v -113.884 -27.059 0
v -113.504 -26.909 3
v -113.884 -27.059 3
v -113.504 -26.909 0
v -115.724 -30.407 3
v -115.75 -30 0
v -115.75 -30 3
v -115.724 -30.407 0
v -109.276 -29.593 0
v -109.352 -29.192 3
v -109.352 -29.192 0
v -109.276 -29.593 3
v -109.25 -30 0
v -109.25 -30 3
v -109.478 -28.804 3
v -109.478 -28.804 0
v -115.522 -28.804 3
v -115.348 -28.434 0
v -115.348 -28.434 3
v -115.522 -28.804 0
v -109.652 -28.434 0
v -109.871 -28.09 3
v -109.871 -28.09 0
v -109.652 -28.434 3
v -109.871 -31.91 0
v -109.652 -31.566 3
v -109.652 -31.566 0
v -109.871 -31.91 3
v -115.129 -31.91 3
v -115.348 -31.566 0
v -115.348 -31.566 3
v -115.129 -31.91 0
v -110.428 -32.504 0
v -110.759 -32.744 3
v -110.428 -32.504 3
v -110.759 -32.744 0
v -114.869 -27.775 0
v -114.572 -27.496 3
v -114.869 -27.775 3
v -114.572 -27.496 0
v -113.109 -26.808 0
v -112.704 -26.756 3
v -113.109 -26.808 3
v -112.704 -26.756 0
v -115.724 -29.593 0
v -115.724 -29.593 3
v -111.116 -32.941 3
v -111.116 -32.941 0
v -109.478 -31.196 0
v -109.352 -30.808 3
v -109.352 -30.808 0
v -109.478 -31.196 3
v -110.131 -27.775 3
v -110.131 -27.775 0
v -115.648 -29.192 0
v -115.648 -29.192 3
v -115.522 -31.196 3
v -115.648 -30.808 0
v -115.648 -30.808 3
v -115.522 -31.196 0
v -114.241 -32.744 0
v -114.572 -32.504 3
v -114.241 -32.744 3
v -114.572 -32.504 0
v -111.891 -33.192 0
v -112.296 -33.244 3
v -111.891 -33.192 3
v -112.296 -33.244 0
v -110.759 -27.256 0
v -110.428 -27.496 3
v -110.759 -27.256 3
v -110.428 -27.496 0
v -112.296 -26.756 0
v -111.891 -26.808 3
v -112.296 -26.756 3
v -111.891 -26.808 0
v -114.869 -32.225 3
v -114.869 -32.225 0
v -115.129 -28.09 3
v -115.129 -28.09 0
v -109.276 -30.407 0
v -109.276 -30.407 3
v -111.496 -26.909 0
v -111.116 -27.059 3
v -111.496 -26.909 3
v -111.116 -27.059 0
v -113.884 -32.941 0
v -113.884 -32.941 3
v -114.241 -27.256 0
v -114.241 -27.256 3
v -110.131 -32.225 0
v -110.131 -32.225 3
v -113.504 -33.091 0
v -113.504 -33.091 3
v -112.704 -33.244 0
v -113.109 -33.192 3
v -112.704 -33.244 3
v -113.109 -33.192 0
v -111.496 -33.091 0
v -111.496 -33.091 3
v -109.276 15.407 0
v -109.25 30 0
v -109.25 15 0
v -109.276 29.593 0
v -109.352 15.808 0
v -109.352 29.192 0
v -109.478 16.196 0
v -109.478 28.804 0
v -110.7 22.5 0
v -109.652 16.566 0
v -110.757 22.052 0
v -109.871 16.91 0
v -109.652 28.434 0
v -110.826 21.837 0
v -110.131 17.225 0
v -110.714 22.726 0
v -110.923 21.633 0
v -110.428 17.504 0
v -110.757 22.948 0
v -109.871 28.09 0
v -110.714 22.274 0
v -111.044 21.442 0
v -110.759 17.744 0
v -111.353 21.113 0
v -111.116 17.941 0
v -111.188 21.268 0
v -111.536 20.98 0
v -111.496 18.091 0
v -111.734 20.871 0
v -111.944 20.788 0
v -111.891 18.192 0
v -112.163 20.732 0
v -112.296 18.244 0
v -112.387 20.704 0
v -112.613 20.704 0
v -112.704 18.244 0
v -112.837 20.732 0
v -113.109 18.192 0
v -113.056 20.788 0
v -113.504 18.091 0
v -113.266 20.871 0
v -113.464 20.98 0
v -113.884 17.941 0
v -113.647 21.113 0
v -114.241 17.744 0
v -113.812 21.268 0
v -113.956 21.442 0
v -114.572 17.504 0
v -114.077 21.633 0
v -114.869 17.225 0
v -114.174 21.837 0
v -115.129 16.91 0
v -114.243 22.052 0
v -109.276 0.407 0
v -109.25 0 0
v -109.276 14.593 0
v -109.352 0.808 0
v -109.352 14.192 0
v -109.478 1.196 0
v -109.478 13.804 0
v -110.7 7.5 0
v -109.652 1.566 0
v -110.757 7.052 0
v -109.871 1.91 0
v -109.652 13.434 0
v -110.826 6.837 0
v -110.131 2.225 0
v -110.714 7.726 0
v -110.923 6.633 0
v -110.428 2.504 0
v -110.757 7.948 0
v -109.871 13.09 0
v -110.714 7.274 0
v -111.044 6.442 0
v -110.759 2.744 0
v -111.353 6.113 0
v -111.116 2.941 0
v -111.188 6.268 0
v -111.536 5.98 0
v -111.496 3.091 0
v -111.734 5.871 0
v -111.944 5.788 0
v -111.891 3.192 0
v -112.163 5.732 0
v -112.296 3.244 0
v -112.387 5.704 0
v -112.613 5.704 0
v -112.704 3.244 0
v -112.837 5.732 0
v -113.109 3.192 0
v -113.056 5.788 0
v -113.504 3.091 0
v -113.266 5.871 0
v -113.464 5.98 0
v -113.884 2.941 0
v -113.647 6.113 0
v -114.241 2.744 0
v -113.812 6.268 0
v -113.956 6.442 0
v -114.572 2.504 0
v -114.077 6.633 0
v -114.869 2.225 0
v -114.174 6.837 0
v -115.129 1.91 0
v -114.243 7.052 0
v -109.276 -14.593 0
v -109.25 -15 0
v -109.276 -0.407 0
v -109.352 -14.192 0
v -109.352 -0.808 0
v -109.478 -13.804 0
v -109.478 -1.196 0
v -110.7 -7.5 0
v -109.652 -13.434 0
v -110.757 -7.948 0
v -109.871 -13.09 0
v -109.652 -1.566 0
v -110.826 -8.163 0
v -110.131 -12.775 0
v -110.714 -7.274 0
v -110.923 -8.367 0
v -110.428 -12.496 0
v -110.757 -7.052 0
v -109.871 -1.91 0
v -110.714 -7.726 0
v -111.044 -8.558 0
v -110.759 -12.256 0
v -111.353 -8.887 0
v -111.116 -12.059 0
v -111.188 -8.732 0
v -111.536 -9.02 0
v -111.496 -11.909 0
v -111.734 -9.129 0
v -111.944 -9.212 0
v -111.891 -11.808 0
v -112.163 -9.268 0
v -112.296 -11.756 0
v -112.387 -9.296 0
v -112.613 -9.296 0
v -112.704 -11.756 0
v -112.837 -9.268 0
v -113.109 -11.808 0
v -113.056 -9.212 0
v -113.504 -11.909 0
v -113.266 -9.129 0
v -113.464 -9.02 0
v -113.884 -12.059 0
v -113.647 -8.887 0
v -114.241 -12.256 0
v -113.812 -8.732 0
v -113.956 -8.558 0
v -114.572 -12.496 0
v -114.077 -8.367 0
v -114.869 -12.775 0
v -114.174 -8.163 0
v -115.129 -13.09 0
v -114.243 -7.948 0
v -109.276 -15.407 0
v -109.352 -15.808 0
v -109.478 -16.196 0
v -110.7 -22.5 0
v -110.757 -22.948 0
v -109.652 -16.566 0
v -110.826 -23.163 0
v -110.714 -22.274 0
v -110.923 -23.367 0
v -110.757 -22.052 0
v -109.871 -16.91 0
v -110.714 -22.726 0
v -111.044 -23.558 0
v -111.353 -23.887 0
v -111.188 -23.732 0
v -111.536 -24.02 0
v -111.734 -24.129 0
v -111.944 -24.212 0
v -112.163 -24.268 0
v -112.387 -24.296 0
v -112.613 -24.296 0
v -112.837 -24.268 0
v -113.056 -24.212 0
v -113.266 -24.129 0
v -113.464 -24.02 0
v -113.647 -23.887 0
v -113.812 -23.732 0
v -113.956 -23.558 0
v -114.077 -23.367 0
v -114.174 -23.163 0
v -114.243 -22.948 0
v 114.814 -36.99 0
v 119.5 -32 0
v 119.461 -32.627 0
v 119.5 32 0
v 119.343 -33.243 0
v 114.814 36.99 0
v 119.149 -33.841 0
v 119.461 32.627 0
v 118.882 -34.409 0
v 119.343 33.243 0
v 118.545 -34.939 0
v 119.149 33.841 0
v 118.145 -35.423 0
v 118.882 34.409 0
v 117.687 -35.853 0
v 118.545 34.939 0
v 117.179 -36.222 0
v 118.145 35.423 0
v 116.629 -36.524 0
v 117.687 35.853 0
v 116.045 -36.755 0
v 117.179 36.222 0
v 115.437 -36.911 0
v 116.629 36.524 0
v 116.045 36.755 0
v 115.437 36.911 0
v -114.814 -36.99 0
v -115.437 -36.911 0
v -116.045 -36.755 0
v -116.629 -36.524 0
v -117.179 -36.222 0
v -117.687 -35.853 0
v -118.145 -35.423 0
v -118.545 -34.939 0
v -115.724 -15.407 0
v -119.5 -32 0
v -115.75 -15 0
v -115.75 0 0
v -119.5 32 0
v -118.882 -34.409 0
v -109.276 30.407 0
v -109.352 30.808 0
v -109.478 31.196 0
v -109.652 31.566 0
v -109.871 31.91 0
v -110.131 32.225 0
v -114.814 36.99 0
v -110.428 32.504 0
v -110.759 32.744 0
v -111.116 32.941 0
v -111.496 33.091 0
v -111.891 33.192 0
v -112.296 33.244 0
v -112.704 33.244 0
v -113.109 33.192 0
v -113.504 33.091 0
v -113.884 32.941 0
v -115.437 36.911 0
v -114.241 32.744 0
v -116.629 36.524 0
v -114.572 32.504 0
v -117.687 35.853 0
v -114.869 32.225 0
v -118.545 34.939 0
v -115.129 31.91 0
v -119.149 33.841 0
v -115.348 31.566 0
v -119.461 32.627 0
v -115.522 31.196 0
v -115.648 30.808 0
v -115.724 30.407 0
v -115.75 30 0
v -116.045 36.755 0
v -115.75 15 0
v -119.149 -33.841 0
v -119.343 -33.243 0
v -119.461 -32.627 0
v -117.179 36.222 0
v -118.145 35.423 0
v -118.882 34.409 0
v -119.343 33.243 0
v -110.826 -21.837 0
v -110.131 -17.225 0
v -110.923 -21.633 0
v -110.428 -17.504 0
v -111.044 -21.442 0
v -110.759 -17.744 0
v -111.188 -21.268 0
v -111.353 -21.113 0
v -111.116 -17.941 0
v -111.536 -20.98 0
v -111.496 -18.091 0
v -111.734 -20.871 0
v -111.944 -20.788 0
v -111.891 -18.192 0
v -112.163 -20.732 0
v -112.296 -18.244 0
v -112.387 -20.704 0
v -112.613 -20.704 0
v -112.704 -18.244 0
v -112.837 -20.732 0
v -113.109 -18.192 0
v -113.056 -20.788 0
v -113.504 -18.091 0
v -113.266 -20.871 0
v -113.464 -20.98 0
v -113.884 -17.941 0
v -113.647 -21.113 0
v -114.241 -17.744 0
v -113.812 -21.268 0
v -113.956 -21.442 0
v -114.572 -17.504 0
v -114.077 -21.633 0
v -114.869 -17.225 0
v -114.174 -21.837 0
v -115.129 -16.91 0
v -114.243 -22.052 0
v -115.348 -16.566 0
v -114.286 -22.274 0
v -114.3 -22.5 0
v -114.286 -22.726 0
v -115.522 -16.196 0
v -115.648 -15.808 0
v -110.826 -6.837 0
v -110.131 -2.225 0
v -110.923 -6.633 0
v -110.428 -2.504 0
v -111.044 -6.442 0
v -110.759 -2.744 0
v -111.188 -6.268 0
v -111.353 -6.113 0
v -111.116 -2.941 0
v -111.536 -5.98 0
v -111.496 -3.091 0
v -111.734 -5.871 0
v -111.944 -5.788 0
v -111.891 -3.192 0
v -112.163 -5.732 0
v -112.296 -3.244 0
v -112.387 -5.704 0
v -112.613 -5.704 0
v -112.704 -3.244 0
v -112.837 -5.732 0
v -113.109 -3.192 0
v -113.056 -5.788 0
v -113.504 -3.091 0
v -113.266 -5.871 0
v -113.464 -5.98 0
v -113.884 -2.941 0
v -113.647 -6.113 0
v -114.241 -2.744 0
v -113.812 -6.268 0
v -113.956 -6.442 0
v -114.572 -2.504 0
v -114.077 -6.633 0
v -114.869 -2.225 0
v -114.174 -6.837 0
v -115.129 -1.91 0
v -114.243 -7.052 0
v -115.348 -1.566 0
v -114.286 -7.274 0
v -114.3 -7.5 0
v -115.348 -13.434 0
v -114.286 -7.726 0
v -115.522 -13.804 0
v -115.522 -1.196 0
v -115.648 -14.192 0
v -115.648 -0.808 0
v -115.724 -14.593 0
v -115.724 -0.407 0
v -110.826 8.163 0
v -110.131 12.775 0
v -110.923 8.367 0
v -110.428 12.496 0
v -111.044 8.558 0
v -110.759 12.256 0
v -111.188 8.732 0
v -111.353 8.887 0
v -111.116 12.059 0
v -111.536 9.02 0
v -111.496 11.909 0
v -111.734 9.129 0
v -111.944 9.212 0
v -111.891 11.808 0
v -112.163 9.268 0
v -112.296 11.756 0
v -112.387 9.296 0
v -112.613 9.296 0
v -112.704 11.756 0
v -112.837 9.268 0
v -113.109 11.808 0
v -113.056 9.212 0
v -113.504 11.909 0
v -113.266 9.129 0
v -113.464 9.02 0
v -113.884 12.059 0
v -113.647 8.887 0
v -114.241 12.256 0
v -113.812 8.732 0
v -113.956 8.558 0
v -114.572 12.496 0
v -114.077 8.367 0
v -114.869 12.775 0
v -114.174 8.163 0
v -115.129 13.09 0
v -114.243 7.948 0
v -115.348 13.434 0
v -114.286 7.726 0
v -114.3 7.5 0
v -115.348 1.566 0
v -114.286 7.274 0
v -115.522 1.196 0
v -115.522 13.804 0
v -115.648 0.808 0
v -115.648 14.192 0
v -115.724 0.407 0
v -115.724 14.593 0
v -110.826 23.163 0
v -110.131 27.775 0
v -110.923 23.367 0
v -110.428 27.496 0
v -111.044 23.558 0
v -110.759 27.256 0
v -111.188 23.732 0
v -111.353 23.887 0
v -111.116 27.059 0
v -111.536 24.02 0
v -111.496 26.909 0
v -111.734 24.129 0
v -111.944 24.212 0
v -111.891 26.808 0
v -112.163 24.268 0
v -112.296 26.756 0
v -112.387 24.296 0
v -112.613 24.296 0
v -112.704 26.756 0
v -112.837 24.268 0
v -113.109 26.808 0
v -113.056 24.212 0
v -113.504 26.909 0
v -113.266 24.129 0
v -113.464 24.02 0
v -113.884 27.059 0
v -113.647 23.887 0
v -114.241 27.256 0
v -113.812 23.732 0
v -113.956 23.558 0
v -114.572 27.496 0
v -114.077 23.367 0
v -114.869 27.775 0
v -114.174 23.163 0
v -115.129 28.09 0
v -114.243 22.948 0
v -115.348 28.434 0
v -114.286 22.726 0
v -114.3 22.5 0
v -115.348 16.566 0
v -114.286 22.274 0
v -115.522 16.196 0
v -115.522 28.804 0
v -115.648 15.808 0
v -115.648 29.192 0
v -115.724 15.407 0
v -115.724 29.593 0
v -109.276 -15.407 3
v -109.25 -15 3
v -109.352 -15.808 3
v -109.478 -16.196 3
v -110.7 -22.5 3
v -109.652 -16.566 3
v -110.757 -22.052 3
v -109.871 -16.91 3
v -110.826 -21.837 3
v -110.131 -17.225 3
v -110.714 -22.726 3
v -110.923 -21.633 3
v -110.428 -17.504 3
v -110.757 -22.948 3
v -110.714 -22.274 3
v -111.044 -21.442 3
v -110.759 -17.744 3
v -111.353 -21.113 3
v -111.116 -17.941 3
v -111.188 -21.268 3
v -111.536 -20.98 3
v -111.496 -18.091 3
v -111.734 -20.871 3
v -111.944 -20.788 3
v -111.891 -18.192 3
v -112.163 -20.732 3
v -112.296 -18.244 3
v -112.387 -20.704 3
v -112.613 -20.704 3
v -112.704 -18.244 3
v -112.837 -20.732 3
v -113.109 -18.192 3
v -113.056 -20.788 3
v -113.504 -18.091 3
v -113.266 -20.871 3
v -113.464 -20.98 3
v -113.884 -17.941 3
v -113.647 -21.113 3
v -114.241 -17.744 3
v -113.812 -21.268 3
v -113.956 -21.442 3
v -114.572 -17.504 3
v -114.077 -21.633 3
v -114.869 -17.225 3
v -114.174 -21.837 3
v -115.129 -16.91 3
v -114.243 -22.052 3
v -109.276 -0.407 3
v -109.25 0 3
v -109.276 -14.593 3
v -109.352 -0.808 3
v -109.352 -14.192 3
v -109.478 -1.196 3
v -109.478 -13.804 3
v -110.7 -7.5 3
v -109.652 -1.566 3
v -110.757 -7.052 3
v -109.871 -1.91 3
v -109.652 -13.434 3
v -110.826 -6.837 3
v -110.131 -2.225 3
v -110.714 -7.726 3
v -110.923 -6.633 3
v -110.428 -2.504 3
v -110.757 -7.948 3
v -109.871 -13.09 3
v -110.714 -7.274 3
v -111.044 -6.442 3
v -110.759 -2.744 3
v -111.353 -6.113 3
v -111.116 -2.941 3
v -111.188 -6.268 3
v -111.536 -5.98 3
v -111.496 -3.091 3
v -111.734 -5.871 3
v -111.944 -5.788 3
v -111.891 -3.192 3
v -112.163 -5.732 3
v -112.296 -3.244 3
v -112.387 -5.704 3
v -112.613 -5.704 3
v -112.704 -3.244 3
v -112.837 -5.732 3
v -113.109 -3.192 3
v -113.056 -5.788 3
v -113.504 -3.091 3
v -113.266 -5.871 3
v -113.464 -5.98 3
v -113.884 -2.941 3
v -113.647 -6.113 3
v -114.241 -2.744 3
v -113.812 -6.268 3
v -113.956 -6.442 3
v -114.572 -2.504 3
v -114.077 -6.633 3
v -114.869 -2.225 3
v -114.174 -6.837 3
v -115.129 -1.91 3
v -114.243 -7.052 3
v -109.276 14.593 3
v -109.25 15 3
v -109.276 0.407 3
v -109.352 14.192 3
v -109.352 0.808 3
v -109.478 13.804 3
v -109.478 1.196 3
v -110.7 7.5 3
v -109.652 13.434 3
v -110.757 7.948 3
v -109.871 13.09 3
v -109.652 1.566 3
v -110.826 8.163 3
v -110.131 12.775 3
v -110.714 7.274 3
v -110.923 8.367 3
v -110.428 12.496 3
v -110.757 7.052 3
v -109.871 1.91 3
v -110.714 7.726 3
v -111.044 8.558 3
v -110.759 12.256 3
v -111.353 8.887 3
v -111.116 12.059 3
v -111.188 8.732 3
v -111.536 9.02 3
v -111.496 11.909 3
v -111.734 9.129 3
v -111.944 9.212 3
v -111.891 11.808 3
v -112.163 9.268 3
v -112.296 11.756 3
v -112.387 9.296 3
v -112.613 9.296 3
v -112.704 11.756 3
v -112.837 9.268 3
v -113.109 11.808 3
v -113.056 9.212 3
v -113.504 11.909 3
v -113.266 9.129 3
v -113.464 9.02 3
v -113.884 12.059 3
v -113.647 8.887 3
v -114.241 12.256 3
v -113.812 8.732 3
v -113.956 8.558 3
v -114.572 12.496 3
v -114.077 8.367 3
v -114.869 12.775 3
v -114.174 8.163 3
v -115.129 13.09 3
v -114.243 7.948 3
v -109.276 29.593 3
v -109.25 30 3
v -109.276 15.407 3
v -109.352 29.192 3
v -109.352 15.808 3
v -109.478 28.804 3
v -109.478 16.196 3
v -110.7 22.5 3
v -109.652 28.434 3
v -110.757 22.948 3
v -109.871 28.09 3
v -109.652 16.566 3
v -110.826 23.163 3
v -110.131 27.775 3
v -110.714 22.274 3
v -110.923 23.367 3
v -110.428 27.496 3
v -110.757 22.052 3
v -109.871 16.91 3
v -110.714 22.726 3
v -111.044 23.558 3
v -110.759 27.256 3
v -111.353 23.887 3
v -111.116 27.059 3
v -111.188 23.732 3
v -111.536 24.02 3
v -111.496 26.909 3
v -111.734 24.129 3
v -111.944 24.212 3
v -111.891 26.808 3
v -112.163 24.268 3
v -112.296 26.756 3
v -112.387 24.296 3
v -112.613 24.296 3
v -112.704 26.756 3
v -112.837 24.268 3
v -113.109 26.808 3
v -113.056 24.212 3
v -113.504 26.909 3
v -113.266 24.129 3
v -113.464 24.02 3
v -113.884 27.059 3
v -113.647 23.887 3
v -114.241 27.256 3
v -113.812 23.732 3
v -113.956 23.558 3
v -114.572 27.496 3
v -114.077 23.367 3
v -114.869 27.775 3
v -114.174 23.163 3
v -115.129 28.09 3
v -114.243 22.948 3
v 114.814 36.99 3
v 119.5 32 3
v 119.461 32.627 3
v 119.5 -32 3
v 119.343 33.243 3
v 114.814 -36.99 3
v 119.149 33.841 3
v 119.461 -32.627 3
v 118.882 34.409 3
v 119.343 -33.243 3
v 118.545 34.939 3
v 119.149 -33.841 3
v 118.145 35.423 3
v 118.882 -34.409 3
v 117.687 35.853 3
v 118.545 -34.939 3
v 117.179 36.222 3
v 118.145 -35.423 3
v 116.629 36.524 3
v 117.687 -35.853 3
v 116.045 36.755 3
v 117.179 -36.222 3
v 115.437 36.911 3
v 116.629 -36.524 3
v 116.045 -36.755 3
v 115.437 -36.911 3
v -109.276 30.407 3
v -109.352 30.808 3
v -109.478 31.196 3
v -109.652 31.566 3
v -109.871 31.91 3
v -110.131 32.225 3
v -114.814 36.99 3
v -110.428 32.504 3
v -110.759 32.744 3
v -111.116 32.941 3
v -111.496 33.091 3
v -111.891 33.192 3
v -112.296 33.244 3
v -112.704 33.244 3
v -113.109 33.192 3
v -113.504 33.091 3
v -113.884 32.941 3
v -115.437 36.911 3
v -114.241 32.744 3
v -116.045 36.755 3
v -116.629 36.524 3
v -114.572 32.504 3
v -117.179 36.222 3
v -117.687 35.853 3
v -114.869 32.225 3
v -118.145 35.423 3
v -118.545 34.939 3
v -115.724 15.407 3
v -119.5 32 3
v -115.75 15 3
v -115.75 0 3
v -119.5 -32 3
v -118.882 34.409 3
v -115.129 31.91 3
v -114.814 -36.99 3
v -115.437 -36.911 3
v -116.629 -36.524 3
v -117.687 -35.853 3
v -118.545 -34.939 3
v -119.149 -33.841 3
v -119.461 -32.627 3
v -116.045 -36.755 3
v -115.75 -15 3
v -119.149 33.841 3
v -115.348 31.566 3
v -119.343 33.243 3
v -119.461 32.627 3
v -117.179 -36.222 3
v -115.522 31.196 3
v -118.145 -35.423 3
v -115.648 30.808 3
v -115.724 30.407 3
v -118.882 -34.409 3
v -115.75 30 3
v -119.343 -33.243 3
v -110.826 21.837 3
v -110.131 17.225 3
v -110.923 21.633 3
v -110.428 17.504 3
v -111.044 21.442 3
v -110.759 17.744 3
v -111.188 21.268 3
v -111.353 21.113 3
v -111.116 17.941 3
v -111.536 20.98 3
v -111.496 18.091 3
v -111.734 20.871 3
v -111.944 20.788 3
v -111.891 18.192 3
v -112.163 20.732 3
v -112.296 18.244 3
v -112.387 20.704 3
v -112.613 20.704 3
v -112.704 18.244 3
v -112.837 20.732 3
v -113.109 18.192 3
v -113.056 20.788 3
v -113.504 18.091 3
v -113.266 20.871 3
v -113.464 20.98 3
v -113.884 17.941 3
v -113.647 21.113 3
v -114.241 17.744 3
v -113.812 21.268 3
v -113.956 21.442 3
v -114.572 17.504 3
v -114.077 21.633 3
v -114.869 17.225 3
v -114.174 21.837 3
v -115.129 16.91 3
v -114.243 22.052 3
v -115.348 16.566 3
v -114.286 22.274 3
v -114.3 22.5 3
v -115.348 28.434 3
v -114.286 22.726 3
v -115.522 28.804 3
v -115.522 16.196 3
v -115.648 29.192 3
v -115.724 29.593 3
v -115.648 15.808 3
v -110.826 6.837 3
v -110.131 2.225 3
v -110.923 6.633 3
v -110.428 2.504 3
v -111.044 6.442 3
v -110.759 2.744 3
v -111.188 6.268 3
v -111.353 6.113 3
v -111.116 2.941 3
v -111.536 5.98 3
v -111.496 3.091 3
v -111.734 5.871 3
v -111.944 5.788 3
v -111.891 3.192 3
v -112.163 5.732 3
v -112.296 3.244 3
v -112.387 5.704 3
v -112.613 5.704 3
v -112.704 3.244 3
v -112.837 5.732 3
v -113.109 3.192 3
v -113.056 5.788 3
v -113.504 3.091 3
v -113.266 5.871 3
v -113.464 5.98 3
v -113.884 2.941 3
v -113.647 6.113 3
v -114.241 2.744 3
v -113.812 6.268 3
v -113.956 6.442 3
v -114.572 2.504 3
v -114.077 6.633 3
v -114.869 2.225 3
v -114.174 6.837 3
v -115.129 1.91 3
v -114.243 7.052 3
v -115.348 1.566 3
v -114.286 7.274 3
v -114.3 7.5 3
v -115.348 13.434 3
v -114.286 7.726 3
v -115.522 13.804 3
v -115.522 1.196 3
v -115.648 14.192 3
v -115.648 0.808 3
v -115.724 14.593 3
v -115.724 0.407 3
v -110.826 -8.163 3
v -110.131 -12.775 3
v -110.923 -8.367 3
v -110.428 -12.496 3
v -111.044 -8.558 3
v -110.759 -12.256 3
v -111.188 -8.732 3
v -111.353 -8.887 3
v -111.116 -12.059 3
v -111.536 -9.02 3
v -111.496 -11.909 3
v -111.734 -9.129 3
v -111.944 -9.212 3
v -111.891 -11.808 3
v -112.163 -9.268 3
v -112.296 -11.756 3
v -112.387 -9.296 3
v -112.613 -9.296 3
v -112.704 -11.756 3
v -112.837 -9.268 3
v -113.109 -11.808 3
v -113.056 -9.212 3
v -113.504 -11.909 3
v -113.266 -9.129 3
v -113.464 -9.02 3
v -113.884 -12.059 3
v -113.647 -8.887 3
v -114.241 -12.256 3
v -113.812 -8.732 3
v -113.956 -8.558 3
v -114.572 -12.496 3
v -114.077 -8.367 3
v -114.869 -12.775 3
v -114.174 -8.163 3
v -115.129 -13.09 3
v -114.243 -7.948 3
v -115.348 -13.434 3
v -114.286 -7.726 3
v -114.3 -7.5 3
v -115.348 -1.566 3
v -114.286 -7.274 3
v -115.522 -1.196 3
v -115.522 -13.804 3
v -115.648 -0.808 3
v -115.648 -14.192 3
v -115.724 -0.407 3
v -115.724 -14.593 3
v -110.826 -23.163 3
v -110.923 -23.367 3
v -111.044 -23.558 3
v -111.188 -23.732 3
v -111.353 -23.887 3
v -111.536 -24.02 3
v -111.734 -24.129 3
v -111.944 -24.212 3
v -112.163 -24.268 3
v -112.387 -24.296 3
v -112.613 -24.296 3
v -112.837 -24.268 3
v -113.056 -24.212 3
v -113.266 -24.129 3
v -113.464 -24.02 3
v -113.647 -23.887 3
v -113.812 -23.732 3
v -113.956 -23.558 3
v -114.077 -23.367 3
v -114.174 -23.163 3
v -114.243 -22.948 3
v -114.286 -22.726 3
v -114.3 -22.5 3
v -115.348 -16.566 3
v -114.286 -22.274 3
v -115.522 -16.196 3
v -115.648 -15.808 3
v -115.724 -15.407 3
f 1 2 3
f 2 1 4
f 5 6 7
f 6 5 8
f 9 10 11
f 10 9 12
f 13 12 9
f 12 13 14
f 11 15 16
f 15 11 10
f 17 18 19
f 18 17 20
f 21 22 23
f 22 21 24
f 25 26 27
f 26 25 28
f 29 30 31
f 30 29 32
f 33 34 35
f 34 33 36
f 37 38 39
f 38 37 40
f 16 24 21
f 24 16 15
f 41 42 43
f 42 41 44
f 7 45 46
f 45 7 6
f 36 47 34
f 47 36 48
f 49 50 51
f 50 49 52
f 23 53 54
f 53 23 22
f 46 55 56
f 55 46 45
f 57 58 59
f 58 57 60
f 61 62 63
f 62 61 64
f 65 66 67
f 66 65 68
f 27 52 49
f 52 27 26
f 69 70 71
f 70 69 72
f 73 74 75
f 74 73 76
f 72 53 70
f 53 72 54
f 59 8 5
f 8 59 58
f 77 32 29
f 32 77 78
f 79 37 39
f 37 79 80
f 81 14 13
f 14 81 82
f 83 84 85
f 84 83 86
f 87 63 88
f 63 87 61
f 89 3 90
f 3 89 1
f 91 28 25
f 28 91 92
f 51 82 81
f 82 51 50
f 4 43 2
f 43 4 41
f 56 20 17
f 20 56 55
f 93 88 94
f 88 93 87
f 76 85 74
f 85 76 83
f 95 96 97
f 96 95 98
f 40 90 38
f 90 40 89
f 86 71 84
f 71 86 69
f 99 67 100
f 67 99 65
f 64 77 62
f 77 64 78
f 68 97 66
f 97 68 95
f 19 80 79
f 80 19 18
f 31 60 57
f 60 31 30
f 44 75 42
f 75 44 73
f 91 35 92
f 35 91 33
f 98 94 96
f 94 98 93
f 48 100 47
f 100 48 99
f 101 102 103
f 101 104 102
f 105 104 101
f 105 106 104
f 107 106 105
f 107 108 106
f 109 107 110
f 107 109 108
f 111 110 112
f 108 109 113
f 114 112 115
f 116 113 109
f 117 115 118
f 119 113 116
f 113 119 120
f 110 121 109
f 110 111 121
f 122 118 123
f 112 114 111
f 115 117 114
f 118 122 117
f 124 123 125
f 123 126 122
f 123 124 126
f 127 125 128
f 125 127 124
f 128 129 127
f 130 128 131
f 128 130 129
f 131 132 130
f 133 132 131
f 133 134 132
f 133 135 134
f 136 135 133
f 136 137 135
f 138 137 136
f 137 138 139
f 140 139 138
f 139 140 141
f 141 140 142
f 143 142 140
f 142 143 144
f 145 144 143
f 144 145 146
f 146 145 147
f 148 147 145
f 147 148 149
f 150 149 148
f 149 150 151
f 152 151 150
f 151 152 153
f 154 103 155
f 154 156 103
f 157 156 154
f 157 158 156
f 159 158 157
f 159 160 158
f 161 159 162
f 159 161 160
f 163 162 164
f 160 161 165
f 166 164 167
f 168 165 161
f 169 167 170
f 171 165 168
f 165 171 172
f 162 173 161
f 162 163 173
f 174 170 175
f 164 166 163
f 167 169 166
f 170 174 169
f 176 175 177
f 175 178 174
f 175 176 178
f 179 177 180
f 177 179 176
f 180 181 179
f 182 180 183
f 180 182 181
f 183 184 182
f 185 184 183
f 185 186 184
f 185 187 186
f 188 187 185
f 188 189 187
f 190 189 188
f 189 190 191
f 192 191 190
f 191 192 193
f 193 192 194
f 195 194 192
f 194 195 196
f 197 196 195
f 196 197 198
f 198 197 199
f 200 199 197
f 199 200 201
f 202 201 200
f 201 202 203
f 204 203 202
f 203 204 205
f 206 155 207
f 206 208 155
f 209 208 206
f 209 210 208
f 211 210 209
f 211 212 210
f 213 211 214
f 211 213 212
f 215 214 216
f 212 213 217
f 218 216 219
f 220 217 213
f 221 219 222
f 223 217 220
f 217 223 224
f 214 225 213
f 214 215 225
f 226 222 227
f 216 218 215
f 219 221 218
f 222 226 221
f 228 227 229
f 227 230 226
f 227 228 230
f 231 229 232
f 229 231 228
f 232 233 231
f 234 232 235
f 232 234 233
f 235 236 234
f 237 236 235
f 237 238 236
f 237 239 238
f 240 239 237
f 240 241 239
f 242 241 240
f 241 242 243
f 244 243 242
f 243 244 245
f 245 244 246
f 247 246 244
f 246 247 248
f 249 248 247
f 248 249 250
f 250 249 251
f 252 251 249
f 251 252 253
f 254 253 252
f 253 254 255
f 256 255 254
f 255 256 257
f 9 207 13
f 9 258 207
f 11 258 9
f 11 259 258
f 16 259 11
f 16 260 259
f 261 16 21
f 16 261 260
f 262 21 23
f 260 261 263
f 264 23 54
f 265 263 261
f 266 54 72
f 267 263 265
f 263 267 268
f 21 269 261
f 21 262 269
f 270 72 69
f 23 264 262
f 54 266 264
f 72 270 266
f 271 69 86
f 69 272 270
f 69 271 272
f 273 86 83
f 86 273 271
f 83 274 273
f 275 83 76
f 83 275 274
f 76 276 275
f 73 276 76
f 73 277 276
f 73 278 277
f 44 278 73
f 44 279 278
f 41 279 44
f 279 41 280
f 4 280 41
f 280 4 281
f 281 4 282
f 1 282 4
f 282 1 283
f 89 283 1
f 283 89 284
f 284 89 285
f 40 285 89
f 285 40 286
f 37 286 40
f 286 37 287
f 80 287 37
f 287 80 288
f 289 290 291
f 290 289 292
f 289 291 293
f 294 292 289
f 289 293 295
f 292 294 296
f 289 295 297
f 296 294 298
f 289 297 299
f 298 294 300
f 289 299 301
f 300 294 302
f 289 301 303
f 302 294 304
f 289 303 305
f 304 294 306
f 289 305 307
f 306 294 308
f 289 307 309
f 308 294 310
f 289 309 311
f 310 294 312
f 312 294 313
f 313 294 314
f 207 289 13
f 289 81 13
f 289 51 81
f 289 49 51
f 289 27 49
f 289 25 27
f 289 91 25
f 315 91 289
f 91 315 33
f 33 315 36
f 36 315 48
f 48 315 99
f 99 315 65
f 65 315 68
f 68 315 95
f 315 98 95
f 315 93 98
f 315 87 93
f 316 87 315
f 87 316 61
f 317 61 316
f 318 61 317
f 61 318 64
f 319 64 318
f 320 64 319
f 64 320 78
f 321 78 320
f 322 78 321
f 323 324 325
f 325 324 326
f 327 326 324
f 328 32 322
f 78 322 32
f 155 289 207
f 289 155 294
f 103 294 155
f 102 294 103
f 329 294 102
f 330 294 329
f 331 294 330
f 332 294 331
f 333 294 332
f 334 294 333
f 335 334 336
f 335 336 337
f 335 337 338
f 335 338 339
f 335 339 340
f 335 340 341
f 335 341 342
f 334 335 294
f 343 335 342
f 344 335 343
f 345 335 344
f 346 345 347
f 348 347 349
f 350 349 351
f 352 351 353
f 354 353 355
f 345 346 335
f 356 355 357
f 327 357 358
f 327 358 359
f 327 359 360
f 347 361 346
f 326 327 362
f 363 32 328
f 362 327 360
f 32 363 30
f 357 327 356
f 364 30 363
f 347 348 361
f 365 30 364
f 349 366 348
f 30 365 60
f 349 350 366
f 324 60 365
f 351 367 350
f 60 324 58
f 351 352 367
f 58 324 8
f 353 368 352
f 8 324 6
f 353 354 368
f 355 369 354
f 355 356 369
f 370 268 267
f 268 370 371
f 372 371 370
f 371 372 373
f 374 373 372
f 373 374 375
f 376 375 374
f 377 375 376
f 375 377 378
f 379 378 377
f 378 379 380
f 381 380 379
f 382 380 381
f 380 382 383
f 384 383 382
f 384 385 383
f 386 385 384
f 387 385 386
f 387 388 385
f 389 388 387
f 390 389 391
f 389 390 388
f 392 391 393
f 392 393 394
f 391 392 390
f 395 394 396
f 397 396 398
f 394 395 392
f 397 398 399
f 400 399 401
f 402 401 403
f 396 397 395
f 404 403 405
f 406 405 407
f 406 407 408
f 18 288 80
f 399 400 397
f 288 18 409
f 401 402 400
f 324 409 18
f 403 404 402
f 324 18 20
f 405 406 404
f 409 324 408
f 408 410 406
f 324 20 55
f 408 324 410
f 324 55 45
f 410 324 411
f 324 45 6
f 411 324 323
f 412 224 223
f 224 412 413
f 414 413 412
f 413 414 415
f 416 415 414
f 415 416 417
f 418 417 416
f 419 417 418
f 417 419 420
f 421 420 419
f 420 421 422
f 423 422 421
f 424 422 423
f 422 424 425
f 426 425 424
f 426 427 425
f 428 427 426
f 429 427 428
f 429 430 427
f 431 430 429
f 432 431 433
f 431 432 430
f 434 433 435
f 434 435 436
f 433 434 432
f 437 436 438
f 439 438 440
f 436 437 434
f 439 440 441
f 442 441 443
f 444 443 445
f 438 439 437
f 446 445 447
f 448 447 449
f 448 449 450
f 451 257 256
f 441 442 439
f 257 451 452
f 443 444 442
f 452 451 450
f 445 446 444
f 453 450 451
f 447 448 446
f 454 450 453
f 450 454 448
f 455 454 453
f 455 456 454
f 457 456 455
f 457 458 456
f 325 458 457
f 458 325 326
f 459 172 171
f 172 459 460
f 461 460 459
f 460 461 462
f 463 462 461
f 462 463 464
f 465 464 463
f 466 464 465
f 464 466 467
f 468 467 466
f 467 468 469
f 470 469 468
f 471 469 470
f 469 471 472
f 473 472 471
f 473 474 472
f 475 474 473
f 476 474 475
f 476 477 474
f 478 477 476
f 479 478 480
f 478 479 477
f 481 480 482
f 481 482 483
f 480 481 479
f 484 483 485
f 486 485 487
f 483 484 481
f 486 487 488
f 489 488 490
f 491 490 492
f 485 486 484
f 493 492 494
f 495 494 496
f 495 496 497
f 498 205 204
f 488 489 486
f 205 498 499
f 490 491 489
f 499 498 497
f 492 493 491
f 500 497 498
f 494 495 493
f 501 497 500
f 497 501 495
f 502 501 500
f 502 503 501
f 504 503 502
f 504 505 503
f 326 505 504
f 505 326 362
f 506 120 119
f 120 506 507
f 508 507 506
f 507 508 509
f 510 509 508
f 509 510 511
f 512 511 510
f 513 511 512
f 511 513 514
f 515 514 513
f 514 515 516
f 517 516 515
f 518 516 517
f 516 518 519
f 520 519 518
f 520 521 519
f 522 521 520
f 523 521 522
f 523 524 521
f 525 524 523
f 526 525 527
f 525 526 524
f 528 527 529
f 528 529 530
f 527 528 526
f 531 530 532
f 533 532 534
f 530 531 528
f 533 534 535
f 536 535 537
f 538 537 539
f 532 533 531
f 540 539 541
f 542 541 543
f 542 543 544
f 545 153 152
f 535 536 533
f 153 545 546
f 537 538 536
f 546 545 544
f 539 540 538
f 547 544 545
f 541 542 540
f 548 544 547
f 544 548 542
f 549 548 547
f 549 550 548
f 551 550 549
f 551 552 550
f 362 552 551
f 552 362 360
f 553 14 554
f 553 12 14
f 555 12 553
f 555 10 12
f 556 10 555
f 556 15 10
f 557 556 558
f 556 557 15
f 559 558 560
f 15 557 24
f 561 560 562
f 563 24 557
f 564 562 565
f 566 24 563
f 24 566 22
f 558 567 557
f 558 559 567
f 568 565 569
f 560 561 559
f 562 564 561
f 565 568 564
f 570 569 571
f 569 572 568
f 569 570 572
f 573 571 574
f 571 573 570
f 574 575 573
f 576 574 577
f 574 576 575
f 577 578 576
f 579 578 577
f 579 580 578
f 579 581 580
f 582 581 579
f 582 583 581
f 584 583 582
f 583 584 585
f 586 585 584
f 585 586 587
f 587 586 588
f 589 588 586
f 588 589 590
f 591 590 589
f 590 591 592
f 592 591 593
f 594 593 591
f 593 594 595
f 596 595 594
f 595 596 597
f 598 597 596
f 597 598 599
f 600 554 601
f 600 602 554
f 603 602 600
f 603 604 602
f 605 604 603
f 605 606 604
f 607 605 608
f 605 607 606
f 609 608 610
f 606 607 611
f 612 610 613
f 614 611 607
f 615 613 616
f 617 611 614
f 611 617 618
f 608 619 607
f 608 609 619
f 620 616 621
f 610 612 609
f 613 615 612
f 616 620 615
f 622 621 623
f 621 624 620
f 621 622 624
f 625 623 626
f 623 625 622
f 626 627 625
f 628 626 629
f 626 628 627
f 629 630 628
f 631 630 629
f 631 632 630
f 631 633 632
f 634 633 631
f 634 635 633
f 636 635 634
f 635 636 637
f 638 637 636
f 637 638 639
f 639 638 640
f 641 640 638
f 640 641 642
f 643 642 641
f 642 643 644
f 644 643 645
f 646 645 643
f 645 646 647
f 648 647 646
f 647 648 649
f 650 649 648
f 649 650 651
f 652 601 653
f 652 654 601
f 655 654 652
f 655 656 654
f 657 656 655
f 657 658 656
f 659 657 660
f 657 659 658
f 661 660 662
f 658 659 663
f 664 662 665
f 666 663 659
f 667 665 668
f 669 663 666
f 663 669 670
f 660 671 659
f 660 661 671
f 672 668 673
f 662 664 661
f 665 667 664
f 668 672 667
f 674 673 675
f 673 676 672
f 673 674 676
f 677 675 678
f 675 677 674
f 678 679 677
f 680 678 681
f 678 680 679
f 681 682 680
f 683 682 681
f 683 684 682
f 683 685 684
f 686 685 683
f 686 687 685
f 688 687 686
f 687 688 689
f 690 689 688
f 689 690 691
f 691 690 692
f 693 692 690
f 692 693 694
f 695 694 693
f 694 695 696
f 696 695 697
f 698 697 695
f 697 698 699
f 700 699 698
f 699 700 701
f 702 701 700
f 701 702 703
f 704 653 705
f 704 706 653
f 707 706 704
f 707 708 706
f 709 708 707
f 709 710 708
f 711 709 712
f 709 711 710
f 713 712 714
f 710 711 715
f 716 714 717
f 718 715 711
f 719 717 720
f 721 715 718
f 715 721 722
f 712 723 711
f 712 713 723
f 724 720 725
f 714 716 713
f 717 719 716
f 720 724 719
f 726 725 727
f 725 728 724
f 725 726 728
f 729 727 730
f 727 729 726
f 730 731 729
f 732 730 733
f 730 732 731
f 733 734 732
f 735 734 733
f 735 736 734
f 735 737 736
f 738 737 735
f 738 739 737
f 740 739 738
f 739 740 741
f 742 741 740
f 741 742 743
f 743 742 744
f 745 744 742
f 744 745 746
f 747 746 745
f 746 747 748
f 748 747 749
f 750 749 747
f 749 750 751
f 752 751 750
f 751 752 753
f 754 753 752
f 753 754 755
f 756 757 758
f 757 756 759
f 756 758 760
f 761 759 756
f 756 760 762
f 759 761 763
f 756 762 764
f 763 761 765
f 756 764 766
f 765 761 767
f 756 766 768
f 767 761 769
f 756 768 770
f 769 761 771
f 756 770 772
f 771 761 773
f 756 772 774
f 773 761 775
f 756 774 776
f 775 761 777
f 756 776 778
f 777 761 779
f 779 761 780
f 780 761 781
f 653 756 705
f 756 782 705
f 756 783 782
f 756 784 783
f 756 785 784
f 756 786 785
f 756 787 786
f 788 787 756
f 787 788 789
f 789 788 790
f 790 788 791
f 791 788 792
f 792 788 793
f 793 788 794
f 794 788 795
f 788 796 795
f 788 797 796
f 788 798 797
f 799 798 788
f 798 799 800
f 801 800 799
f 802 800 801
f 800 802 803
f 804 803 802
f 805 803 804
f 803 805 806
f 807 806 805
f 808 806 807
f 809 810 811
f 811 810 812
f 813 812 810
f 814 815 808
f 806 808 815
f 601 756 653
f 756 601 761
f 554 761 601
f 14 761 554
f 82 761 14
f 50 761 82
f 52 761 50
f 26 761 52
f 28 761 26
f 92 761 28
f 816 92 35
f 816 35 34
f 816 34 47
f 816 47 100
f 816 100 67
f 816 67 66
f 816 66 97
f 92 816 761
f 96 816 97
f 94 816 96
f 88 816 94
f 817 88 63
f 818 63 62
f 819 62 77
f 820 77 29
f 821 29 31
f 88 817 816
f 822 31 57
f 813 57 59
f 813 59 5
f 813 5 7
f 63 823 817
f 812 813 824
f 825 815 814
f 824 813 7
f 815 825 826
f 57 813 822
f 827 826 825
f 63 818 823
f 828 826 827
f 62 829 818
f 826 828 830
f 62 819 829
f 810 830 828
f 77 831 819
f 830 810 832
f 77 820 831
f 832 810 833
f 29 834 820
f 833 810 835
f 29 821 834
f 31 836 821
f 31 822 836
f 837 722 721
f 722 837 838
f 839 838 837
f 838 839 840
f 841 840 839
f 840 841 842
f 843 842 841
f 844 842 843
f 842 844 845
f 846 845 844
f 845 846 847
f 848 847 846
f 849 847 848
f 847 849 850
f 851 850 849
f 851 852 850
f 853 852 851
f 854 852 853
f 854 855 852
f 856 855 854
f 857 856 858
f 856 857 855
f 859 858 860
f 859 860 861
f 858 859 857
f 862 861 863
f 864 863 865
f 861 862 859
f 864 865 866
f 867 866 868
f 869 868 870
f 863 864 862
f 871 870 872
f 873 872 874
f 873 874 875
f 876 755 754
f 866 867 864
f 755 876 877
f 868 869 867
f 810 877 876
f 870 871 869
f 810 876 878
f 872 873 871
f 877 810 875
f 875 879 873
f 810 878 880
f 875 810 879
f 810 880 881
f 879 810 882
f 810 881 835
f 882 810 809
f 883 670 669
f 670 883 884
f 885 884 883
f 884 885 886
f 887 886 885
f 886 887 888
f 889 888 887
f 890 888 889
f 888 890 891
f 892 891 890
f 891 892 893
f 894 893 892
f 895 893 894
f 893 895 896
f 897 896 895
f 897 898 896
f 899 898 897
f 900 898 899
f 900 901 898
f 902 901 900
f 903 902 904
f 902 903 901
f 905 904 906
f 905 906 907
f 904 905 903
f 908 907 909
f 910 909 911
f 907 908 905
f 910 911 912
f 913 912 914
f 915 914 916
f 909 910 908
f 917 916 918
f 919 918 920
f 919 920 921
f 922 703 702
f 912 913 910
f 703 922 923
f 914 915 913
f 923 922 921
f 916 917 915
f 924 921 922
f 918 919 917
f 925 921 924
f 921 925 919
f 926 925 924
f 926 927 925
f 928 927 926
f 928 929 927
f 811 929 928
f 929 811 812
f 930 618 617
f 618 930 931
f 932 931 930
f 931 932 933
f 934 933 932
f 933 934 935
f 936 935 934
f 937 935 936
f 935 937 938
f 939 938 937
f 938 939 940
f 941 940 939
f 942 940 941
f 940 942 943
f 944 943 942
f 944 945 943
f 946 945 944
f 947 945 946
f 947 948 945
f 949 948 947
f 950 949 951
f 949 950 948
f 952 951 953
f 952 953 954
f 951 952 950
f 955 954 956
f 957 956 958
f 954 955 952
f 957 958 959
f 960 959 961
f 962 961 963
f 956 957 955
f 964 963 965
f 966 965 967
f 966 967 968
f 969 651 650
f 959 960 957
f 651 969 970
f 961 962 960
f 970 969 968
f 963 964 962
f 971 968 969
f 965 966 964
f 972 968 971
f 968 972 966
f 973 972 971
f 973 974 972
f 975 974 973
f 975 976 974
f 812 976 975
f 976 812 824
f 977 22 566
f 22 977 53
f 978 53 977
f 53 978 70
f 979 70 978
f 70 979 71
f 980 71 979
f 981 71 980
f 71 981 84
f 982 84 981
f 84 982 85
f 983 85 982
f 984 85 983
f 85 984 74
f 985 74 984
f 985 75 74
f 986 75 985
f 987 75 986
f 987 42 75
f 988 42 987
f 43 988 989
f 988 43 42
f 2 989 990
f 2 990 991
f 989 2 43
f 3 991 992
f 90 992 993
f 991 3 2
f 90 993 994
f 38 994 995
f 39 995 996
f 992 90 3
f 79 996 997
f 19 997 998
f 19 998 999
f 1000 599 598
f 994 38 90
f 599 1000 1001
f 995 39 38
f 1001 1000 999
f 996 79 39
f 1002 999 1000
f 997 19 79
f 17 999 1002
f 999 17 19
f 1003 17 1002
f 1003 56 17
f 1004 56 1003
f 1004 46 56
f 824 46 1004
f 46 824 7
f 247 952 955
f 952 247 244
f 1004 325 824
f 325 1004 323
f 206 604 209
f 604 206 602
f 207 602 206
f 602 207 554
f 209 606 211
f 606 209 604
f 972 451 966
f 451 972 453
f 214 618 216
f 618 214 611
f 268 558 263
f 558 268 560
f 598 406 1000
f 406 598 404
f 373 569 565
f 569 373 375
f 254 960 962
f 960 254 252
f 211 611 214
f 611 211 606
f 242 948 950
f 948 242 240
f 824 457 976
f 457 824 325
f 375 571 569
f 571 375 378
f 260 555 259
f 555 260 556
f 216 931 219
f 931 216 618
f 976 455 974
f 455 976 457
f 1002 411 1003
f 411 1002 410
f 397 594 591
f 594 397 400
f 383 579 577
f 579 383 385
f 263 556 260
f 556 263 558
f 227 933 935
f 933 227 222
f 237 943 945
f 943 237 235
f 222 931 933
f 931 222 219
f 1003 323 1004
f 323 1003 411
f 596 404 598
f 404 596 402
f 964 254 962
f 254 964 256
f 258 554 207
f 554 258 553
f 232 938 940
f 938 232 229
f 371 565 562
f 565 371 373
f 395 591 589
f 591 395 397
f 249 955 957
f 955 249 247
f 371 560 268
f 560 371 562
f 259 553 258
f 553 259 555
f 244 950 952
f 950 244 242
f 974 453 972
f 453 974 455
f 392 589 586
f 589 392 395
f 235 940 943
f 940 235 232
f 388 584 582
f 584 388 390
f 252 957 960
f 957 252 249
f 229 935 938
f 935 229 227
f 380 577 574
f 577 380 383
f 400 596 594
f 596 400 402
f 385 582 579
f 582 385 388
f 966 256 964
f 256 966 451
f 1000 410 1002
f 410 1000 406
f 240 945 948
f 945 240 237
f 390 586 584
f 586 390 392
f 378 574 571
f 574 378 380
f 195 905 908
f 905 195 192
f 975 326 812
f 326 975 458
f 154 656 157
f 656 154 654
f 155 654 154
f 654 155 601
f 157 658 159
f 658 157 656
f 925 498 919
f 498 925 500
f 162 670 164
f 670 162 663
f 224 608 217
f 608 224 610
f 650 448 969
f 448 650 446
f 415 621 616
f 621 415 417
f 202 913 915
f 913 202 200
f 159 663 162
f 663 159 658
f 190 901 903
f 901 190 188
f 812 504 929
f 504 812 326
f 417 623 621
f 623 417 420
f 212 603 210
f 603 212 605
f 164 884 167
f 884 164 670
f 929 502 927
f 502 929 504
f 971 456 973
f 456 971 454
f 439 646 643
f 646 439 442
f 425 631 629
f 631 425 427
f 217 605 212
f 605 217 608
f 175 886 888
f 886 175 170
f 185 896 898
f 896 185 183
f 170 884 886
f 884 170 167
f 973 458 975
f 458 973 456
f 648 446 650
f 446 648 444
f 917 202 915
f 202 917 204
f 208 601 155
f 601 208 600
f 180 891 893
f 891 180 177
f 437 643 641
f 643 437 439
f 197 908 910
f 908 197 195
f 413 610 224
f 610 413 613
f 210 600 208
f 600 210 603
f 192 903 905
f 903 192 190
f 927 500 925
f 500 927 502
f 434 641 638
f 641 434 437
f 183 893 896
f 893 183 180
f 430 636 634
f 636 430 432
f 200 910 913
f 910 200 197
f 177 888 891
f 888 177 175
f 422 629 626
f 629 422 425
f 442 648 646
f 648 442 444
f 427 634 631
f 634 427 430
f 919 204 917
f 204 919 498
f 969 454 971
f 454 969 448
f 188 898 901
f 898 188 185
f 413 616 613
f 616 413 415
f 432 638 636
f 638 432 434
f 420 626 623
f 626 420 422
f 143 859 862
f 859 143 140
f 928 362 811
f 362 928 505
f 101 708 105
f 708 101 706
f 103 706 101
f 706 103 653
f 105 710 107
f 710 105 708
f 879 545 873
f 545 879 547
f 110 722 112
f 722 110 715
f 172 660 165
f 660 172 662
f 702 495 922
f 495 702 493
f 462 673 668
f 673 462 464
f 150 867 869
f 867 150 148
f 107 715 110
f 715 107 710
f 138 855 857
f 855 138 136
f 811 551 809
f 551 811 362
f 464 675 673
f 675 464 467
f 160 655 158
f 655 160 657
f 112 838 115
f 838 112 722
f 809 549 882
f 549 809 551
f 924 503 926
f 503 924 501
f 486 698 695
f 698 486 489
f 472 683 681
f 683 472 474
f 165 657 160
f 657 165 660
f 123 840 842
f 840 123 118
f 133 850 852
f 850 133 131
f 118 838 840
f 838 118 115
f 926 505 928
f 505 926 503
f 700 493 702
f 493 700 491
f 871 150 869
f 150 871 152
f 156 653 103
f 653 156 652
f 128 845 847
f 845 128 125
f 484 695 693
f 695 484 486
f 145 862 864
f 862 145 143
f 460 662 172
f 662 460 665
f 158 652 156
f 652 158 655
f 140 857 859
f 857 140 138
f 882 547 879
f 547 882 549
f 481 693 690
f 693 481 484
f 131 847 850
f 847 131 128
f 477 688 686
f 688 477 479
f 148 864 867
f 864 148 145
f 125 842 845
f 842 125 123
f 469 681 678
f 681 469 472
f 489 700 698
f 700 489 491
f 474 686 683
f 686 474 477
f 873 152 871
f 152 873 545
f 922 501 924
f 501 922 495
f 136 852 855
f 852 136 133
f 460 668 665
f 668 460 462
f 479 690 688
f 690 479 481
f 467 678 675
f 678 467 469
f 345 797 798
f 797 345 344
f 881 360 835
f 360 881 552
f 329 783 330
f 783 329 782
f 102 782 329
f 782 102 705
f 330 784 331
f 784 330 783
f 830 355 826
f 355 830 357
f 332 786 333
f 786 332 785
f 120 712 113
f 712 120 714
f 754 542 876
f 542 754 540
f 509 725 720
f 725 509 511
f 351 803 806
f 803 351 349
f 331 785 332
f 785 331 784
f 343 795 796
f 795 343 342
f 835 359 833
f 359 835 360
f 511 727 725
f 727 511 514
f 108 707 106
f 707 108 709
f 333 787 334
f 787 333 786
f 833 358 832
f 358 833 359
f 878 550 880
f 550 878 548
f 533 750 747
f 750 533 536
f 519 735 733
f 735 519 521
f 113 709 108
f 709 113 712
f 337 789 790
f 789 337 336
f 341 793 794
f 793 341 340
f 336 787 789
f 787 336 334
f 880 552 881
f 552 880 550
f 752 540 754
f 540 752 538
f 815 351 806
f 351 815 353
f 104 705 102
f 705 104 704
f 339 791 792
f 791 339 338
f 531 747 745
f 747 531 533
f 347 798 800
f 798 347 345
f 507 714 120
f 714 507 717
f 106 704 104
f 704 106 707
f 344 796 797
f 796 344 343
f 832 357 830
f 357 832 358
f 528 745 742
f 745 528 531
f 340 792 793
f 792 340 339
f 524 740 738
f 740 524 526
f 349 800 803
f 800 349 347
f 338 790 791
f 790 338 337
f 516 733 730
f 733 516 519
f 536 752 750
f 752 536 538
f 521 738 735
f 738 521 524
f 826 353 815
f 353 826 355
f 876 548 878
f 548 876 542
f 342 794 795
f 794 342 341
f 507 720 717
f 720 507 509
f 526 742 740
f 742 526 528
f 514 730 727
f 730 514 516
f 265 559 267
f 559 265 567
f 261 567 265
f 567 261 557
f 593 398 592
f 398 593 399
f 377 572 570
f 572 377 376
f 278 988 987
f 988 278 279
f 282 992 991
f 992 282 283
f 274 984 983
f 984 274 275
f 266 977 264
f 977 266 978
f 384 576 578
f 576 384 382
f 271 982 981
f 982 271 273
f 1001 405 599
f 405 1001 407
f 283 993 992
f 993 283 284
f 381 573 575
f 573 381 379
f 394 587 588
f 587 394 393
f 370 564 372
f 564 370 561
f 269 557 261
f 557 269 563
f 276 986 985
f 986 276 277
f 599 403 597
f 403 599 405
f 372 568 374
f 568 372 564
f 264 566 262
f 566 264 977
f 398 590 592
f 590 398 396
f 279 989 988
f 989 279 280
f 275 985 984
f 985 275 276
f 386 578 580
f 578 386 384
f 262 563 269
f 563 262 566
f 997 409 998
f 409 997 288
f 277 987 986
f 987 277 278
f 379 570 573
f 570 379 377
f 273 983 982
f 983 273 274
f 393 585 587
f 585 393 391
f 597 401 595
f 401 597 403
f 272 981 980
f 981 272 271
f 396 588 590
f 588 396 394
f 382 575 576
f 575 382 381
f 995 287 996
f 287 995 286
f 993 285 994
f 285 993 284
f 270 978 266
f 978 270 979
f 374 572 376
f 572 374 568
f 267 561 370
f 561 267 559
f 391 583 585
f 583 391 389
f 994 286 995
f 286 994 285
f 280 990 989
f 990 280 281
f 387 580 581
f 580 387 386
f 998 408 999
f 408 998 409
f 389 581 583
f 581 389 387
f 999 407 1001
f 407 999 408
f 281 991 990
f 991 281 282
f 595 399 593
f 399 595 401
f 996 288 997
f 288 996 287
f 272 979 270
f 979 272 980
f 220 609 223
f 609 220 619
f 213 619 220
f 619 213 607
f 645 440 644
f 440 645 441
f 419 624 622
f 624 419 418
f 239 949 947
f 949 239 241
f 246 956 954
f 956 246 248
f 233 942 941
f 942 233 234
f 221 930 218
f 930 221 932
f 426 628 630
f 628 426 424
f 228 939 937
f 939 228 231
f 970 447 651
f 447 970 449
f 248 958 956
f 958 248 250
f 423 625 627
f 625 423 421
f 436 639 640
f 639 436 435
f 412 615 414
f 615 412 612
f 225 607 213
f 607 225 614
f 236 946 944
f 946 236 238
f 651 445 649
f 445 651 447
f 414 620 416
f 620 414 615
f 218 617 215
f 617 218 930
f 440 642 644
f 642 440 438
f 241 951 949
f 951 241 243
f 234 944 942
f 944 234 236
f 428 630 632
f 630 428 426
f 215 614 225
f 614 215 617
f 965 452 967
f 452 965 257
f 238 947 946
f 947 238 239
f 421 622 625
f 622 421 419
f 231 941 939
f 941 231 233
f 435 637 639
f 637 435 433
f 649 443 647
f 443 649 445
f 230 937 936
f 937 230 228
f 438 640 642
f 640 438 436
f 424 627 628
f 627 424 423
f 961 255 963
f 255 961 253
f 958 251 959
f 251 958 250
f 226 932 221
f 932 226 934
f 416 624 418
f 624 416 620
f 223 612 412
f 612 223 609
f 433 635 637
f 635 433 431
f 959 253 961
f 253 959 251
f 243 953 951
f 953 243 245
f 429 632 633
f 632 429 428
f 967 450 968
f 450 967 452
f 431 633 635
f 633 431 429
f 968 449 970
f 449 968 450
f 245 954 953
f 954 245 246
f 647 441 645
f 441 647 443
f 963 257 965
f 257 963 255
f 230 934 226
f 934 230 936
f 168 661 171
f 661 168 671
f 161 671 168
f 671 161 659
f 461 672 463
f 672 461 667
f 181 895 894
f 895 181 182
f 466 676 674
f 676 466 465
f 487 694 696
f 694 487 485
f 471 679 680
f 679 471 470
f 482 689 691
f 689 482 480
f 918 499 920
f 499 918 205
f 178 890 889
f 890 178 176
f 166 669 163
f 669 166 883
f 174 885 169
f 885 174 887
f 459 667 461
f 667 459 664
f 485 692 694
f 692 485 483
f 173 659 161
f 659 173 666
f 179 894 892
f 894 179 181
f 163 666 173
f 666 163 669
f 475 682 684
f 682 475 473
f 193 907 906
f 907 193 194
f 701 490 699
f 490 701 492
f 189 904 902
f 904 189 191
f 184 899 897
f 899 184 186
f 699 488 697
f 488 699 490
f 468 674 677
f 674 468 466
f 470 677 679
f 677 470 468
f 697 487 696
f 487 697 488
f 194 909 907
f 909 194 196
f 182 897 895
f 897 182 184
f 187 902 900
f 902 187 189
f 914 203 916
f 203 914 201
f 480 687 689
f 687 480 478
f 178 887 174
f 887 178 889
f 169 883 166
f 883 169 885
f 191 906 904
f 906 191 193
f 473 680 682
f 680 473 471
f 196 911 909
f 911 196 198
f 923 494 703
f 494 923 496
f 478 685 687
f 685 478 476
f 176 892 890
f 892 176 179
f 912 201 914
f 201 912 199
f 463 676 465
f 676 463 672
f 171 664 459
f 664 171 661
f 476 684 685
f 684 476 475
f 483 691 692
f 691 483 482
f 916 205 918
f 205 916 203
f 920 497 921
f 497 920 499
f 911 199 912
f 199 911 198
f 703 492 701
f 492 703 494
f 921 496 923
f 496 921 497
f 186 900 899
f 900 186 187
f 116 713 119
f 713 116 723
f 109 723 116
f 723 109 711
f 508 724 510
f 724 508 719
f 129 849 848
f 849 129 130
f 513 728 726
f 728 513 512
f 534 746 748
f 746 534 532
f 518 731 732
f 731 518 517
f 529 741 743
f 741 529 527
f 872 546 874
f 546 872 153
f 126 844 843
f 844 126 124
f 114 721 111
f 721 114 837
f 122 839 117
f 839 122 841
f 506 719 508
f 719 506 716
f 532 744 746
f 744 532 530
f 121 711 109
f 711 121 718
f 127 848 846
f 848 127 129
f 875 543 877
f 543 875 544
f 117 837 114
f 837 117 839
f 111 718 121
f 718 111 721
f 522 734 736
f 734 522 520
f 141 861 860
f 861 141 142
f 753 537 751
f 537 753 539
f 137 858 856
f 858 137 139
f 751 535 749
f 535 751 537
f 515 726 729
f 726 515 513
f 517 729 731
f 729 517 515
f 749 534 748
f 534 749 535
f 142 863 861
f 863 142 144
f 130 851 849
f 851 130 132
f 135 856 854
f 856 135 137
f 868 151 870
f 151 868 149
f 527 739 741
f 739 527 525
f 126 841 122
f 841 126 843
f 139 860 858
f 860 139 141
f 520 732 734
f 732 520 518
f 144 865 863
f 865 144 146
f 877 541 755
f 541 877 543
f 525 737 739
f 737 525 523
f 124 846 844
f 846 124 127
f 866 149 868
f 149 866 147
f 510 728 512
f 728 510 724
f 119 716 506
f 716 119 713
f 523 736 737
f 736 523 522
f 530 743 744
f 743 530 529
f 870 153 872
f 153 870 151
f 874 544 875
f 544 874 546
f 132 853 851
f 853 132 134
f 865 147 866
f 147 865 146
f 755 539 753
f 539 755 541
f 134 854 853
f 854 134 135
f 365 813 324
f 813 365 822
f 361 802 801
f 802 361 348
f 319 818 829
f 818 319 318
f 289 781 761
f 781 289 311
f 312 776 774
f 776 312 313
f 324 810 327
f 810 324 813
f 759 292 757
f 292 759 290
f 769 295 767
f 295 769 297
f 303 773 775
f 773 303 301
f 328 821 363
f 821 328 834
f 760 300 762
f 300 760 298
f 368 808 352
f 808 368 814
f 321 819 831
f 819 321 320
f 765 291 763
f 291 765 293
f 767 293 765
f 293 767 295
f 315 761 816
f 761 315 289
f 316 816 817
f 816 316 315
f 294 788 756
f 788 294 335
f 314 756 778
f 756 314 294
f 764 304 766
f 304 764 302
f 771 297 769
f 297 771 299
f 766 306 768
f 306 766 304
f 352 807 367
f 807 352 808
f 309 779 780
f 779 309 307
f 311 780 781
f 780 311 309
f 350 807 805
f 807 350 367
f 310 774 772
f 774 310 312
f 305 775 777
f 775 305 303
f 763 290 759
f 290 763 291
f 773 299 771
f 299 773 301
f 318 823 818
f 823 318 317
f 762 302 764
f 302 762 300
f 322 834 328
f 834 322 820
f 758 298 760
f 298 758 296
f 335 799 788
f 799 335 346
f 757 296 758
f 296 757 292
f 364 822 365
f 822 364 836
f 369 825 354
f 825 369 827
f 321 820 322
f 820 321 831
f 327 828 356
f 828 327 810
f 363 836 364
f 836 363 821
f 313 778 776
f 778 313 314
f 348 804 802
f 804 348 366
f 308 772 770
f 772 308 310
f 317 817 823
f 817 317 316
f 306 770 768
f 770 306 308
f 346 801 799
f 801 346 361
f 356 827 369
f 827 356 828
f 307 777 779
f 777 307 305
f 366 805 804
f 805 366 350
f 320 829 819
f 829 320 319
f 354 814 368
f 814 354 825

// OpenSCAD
$fn = 50;


difference() {
	union() {
		hull() {
			translate(v = [-114.5000000000, 32.0000000000, 0]) {
				cylinder(h = 3, r = 5);
			}
			translate(v = [114.5000000000, 32.0000000000, 0]) {
				cylinder(h = 3, r = 5);
			}
			translate(v = [-114.5000000000, -32.0000000000, 0]) {
				cylinder(h = 3, r = 5);
			}
			translate(v = [114.5000000000, -32.0000000000, 0]) {
				cylinder(h = 3, r = 5);
			}
		}
	}
	union() {
		translate(v = [-112.5000000000, -30.0000000000, 0]) {
			cylinder(h = 3, r = 3.2500000000);
		}
		translate(v = [-112.5000000000, -15.0000000000, 0]) {
			cylinder(h = 3, r = 3.2500000000);
		}
		translate(v = [-112.5000000000, 0.0000000000, 0]) {
			cylinder(h = 3, r = 3.2500000000);
		}
		translate(v = [-112.5000000000, 15.0000000000, 0]) {
			cylinder(h = 3, r = 3.2500000000);
		}
		translate(v = [-112.5000000000, 30.0000000000, 0]) {
			cylinder(h = 3, r = 3.2500000000);
		}
		translate(v = [-112.5000000000, -30.0000000000, 0]) {
			cylinder(h = 3, r = 1.8000000000);
		}
		translate(v = [-112.5000000000, -22.5000000000, 0]) {
			cylinder(h = 3, r = 1.8000000000);
		}
		translate(v = [-112.5000000000, -15.0000000000, 0]) {
			cylinder(h = 3, r = 1.8000000000);
		}
		translate(v = [-112.5000000000, -7.5000000000, 0]) {
			cylinder(h = 3, r = 1.8000000000);
		}
		translate(v = [-112.5000000000, 0.0000000000, 0]) {
			cylinder(h = 3, r = 1.8000000000);
		}
		translate(v = [-112.5000000000, 7.5000000000, 0]) {
			cylinder(h = 3, r = 1.8000000000);
		}
		translate(v = [-112.5000000000, 15.0000000000, 0]) {
			cylinder(h = 3, r = 1.8000000000);
		}
		translate(v = [-112.5000000000, 22.5000000000, 0]) {
			cylinder(h = 3, r = 1.8000000000);
		}
		translate(v = [-112.5000000000, 30.0000000000, 0]) {
			cylinder(h = 3, r = 1.8000000000);
		}
		translate(v = [-112.5000000000, -30.0000000000, 0]) {
			cylinder(h = 3, r = 1.8000000000);
		}
		translate(v = [-112.5000000000, -22.5000000000, 0]) {
			cylinder(h = 3, r = 1.8000000000);
		}
		translate(v = [-112.5000000000, -15.0000000000, 0]) {
			cylinder(h = 3, r = 1.8000000000);
		}
		translate(v = [-112.5000000000, -7.5000000000, 0]) {
			cylinder(h = 3, r = 1.8000000000);
		}
		translate(v = [-112.5000000000, 0.0000000000, 0]) {
			cylinder(h = 3, r = 1.8000000000);
		}
		translate(v = [-112.5000000000, 7.5000000000, 0]) {
			cylinder(h = 3, r = 1.8000000000);
		}
		translate(v = [-112.5000000000, 15.0000000000, 0]) {
			cylinder(h = 3, r = 1.8000000000);
		}
		translate(v = [-112.5000000000, 22.5000000000, 0]) {
			cylinder(h = 3, r = 1.8000000000);
		}
		translate(v = [-112.5000000000, 30.0000000000, 0]) {
			cylinder(h = 3, r = 1.8000000000);
		}
		translate(v = [-112.5000000000, -30.0000000000, 0]) {
			cylinder(h = 3, r = 1.8000000000);
		}
		translate(v = [-112.5000000000, -22.5000000000, 0]) {
			cylinder(h = 3, r = 1.8000000000);
		}
		translate(v = [-112.5000000000, -15.0000000000, 0]) {
			cylinder(h = 3, r = 1.8000000000);
		}
		translate(v = [-112.5000000000, -7.5000000000, 0]) {
			cylinder(h = 3, r = 1.8000000000);
		}
		translate(v = [-112.5000000000, 0.0000000000, 0]) {
			cylinder(h = 3, r = 1.8000000000);
		}
		translate(v = [-112.5000000000, 7.5000000000, 0]) {
			cylinder(h = 3, r = 1.8000000000);
		}
		translate(v = [-112.5000000000, 15.0000000000, 0]) {
			cylinder(h = 3, r = 1.8000000000);
		}
		translate(v = [-112.5000000000, 22.5000000000, 0]) {
			cylinder(h = 3, r = 1.8000000000);
		}
		translate(v = [-112.5000000000, 30.0000000000, 0]) {
			cylinder(h = 3, r = 1.8000000000);
		}
	}
}
